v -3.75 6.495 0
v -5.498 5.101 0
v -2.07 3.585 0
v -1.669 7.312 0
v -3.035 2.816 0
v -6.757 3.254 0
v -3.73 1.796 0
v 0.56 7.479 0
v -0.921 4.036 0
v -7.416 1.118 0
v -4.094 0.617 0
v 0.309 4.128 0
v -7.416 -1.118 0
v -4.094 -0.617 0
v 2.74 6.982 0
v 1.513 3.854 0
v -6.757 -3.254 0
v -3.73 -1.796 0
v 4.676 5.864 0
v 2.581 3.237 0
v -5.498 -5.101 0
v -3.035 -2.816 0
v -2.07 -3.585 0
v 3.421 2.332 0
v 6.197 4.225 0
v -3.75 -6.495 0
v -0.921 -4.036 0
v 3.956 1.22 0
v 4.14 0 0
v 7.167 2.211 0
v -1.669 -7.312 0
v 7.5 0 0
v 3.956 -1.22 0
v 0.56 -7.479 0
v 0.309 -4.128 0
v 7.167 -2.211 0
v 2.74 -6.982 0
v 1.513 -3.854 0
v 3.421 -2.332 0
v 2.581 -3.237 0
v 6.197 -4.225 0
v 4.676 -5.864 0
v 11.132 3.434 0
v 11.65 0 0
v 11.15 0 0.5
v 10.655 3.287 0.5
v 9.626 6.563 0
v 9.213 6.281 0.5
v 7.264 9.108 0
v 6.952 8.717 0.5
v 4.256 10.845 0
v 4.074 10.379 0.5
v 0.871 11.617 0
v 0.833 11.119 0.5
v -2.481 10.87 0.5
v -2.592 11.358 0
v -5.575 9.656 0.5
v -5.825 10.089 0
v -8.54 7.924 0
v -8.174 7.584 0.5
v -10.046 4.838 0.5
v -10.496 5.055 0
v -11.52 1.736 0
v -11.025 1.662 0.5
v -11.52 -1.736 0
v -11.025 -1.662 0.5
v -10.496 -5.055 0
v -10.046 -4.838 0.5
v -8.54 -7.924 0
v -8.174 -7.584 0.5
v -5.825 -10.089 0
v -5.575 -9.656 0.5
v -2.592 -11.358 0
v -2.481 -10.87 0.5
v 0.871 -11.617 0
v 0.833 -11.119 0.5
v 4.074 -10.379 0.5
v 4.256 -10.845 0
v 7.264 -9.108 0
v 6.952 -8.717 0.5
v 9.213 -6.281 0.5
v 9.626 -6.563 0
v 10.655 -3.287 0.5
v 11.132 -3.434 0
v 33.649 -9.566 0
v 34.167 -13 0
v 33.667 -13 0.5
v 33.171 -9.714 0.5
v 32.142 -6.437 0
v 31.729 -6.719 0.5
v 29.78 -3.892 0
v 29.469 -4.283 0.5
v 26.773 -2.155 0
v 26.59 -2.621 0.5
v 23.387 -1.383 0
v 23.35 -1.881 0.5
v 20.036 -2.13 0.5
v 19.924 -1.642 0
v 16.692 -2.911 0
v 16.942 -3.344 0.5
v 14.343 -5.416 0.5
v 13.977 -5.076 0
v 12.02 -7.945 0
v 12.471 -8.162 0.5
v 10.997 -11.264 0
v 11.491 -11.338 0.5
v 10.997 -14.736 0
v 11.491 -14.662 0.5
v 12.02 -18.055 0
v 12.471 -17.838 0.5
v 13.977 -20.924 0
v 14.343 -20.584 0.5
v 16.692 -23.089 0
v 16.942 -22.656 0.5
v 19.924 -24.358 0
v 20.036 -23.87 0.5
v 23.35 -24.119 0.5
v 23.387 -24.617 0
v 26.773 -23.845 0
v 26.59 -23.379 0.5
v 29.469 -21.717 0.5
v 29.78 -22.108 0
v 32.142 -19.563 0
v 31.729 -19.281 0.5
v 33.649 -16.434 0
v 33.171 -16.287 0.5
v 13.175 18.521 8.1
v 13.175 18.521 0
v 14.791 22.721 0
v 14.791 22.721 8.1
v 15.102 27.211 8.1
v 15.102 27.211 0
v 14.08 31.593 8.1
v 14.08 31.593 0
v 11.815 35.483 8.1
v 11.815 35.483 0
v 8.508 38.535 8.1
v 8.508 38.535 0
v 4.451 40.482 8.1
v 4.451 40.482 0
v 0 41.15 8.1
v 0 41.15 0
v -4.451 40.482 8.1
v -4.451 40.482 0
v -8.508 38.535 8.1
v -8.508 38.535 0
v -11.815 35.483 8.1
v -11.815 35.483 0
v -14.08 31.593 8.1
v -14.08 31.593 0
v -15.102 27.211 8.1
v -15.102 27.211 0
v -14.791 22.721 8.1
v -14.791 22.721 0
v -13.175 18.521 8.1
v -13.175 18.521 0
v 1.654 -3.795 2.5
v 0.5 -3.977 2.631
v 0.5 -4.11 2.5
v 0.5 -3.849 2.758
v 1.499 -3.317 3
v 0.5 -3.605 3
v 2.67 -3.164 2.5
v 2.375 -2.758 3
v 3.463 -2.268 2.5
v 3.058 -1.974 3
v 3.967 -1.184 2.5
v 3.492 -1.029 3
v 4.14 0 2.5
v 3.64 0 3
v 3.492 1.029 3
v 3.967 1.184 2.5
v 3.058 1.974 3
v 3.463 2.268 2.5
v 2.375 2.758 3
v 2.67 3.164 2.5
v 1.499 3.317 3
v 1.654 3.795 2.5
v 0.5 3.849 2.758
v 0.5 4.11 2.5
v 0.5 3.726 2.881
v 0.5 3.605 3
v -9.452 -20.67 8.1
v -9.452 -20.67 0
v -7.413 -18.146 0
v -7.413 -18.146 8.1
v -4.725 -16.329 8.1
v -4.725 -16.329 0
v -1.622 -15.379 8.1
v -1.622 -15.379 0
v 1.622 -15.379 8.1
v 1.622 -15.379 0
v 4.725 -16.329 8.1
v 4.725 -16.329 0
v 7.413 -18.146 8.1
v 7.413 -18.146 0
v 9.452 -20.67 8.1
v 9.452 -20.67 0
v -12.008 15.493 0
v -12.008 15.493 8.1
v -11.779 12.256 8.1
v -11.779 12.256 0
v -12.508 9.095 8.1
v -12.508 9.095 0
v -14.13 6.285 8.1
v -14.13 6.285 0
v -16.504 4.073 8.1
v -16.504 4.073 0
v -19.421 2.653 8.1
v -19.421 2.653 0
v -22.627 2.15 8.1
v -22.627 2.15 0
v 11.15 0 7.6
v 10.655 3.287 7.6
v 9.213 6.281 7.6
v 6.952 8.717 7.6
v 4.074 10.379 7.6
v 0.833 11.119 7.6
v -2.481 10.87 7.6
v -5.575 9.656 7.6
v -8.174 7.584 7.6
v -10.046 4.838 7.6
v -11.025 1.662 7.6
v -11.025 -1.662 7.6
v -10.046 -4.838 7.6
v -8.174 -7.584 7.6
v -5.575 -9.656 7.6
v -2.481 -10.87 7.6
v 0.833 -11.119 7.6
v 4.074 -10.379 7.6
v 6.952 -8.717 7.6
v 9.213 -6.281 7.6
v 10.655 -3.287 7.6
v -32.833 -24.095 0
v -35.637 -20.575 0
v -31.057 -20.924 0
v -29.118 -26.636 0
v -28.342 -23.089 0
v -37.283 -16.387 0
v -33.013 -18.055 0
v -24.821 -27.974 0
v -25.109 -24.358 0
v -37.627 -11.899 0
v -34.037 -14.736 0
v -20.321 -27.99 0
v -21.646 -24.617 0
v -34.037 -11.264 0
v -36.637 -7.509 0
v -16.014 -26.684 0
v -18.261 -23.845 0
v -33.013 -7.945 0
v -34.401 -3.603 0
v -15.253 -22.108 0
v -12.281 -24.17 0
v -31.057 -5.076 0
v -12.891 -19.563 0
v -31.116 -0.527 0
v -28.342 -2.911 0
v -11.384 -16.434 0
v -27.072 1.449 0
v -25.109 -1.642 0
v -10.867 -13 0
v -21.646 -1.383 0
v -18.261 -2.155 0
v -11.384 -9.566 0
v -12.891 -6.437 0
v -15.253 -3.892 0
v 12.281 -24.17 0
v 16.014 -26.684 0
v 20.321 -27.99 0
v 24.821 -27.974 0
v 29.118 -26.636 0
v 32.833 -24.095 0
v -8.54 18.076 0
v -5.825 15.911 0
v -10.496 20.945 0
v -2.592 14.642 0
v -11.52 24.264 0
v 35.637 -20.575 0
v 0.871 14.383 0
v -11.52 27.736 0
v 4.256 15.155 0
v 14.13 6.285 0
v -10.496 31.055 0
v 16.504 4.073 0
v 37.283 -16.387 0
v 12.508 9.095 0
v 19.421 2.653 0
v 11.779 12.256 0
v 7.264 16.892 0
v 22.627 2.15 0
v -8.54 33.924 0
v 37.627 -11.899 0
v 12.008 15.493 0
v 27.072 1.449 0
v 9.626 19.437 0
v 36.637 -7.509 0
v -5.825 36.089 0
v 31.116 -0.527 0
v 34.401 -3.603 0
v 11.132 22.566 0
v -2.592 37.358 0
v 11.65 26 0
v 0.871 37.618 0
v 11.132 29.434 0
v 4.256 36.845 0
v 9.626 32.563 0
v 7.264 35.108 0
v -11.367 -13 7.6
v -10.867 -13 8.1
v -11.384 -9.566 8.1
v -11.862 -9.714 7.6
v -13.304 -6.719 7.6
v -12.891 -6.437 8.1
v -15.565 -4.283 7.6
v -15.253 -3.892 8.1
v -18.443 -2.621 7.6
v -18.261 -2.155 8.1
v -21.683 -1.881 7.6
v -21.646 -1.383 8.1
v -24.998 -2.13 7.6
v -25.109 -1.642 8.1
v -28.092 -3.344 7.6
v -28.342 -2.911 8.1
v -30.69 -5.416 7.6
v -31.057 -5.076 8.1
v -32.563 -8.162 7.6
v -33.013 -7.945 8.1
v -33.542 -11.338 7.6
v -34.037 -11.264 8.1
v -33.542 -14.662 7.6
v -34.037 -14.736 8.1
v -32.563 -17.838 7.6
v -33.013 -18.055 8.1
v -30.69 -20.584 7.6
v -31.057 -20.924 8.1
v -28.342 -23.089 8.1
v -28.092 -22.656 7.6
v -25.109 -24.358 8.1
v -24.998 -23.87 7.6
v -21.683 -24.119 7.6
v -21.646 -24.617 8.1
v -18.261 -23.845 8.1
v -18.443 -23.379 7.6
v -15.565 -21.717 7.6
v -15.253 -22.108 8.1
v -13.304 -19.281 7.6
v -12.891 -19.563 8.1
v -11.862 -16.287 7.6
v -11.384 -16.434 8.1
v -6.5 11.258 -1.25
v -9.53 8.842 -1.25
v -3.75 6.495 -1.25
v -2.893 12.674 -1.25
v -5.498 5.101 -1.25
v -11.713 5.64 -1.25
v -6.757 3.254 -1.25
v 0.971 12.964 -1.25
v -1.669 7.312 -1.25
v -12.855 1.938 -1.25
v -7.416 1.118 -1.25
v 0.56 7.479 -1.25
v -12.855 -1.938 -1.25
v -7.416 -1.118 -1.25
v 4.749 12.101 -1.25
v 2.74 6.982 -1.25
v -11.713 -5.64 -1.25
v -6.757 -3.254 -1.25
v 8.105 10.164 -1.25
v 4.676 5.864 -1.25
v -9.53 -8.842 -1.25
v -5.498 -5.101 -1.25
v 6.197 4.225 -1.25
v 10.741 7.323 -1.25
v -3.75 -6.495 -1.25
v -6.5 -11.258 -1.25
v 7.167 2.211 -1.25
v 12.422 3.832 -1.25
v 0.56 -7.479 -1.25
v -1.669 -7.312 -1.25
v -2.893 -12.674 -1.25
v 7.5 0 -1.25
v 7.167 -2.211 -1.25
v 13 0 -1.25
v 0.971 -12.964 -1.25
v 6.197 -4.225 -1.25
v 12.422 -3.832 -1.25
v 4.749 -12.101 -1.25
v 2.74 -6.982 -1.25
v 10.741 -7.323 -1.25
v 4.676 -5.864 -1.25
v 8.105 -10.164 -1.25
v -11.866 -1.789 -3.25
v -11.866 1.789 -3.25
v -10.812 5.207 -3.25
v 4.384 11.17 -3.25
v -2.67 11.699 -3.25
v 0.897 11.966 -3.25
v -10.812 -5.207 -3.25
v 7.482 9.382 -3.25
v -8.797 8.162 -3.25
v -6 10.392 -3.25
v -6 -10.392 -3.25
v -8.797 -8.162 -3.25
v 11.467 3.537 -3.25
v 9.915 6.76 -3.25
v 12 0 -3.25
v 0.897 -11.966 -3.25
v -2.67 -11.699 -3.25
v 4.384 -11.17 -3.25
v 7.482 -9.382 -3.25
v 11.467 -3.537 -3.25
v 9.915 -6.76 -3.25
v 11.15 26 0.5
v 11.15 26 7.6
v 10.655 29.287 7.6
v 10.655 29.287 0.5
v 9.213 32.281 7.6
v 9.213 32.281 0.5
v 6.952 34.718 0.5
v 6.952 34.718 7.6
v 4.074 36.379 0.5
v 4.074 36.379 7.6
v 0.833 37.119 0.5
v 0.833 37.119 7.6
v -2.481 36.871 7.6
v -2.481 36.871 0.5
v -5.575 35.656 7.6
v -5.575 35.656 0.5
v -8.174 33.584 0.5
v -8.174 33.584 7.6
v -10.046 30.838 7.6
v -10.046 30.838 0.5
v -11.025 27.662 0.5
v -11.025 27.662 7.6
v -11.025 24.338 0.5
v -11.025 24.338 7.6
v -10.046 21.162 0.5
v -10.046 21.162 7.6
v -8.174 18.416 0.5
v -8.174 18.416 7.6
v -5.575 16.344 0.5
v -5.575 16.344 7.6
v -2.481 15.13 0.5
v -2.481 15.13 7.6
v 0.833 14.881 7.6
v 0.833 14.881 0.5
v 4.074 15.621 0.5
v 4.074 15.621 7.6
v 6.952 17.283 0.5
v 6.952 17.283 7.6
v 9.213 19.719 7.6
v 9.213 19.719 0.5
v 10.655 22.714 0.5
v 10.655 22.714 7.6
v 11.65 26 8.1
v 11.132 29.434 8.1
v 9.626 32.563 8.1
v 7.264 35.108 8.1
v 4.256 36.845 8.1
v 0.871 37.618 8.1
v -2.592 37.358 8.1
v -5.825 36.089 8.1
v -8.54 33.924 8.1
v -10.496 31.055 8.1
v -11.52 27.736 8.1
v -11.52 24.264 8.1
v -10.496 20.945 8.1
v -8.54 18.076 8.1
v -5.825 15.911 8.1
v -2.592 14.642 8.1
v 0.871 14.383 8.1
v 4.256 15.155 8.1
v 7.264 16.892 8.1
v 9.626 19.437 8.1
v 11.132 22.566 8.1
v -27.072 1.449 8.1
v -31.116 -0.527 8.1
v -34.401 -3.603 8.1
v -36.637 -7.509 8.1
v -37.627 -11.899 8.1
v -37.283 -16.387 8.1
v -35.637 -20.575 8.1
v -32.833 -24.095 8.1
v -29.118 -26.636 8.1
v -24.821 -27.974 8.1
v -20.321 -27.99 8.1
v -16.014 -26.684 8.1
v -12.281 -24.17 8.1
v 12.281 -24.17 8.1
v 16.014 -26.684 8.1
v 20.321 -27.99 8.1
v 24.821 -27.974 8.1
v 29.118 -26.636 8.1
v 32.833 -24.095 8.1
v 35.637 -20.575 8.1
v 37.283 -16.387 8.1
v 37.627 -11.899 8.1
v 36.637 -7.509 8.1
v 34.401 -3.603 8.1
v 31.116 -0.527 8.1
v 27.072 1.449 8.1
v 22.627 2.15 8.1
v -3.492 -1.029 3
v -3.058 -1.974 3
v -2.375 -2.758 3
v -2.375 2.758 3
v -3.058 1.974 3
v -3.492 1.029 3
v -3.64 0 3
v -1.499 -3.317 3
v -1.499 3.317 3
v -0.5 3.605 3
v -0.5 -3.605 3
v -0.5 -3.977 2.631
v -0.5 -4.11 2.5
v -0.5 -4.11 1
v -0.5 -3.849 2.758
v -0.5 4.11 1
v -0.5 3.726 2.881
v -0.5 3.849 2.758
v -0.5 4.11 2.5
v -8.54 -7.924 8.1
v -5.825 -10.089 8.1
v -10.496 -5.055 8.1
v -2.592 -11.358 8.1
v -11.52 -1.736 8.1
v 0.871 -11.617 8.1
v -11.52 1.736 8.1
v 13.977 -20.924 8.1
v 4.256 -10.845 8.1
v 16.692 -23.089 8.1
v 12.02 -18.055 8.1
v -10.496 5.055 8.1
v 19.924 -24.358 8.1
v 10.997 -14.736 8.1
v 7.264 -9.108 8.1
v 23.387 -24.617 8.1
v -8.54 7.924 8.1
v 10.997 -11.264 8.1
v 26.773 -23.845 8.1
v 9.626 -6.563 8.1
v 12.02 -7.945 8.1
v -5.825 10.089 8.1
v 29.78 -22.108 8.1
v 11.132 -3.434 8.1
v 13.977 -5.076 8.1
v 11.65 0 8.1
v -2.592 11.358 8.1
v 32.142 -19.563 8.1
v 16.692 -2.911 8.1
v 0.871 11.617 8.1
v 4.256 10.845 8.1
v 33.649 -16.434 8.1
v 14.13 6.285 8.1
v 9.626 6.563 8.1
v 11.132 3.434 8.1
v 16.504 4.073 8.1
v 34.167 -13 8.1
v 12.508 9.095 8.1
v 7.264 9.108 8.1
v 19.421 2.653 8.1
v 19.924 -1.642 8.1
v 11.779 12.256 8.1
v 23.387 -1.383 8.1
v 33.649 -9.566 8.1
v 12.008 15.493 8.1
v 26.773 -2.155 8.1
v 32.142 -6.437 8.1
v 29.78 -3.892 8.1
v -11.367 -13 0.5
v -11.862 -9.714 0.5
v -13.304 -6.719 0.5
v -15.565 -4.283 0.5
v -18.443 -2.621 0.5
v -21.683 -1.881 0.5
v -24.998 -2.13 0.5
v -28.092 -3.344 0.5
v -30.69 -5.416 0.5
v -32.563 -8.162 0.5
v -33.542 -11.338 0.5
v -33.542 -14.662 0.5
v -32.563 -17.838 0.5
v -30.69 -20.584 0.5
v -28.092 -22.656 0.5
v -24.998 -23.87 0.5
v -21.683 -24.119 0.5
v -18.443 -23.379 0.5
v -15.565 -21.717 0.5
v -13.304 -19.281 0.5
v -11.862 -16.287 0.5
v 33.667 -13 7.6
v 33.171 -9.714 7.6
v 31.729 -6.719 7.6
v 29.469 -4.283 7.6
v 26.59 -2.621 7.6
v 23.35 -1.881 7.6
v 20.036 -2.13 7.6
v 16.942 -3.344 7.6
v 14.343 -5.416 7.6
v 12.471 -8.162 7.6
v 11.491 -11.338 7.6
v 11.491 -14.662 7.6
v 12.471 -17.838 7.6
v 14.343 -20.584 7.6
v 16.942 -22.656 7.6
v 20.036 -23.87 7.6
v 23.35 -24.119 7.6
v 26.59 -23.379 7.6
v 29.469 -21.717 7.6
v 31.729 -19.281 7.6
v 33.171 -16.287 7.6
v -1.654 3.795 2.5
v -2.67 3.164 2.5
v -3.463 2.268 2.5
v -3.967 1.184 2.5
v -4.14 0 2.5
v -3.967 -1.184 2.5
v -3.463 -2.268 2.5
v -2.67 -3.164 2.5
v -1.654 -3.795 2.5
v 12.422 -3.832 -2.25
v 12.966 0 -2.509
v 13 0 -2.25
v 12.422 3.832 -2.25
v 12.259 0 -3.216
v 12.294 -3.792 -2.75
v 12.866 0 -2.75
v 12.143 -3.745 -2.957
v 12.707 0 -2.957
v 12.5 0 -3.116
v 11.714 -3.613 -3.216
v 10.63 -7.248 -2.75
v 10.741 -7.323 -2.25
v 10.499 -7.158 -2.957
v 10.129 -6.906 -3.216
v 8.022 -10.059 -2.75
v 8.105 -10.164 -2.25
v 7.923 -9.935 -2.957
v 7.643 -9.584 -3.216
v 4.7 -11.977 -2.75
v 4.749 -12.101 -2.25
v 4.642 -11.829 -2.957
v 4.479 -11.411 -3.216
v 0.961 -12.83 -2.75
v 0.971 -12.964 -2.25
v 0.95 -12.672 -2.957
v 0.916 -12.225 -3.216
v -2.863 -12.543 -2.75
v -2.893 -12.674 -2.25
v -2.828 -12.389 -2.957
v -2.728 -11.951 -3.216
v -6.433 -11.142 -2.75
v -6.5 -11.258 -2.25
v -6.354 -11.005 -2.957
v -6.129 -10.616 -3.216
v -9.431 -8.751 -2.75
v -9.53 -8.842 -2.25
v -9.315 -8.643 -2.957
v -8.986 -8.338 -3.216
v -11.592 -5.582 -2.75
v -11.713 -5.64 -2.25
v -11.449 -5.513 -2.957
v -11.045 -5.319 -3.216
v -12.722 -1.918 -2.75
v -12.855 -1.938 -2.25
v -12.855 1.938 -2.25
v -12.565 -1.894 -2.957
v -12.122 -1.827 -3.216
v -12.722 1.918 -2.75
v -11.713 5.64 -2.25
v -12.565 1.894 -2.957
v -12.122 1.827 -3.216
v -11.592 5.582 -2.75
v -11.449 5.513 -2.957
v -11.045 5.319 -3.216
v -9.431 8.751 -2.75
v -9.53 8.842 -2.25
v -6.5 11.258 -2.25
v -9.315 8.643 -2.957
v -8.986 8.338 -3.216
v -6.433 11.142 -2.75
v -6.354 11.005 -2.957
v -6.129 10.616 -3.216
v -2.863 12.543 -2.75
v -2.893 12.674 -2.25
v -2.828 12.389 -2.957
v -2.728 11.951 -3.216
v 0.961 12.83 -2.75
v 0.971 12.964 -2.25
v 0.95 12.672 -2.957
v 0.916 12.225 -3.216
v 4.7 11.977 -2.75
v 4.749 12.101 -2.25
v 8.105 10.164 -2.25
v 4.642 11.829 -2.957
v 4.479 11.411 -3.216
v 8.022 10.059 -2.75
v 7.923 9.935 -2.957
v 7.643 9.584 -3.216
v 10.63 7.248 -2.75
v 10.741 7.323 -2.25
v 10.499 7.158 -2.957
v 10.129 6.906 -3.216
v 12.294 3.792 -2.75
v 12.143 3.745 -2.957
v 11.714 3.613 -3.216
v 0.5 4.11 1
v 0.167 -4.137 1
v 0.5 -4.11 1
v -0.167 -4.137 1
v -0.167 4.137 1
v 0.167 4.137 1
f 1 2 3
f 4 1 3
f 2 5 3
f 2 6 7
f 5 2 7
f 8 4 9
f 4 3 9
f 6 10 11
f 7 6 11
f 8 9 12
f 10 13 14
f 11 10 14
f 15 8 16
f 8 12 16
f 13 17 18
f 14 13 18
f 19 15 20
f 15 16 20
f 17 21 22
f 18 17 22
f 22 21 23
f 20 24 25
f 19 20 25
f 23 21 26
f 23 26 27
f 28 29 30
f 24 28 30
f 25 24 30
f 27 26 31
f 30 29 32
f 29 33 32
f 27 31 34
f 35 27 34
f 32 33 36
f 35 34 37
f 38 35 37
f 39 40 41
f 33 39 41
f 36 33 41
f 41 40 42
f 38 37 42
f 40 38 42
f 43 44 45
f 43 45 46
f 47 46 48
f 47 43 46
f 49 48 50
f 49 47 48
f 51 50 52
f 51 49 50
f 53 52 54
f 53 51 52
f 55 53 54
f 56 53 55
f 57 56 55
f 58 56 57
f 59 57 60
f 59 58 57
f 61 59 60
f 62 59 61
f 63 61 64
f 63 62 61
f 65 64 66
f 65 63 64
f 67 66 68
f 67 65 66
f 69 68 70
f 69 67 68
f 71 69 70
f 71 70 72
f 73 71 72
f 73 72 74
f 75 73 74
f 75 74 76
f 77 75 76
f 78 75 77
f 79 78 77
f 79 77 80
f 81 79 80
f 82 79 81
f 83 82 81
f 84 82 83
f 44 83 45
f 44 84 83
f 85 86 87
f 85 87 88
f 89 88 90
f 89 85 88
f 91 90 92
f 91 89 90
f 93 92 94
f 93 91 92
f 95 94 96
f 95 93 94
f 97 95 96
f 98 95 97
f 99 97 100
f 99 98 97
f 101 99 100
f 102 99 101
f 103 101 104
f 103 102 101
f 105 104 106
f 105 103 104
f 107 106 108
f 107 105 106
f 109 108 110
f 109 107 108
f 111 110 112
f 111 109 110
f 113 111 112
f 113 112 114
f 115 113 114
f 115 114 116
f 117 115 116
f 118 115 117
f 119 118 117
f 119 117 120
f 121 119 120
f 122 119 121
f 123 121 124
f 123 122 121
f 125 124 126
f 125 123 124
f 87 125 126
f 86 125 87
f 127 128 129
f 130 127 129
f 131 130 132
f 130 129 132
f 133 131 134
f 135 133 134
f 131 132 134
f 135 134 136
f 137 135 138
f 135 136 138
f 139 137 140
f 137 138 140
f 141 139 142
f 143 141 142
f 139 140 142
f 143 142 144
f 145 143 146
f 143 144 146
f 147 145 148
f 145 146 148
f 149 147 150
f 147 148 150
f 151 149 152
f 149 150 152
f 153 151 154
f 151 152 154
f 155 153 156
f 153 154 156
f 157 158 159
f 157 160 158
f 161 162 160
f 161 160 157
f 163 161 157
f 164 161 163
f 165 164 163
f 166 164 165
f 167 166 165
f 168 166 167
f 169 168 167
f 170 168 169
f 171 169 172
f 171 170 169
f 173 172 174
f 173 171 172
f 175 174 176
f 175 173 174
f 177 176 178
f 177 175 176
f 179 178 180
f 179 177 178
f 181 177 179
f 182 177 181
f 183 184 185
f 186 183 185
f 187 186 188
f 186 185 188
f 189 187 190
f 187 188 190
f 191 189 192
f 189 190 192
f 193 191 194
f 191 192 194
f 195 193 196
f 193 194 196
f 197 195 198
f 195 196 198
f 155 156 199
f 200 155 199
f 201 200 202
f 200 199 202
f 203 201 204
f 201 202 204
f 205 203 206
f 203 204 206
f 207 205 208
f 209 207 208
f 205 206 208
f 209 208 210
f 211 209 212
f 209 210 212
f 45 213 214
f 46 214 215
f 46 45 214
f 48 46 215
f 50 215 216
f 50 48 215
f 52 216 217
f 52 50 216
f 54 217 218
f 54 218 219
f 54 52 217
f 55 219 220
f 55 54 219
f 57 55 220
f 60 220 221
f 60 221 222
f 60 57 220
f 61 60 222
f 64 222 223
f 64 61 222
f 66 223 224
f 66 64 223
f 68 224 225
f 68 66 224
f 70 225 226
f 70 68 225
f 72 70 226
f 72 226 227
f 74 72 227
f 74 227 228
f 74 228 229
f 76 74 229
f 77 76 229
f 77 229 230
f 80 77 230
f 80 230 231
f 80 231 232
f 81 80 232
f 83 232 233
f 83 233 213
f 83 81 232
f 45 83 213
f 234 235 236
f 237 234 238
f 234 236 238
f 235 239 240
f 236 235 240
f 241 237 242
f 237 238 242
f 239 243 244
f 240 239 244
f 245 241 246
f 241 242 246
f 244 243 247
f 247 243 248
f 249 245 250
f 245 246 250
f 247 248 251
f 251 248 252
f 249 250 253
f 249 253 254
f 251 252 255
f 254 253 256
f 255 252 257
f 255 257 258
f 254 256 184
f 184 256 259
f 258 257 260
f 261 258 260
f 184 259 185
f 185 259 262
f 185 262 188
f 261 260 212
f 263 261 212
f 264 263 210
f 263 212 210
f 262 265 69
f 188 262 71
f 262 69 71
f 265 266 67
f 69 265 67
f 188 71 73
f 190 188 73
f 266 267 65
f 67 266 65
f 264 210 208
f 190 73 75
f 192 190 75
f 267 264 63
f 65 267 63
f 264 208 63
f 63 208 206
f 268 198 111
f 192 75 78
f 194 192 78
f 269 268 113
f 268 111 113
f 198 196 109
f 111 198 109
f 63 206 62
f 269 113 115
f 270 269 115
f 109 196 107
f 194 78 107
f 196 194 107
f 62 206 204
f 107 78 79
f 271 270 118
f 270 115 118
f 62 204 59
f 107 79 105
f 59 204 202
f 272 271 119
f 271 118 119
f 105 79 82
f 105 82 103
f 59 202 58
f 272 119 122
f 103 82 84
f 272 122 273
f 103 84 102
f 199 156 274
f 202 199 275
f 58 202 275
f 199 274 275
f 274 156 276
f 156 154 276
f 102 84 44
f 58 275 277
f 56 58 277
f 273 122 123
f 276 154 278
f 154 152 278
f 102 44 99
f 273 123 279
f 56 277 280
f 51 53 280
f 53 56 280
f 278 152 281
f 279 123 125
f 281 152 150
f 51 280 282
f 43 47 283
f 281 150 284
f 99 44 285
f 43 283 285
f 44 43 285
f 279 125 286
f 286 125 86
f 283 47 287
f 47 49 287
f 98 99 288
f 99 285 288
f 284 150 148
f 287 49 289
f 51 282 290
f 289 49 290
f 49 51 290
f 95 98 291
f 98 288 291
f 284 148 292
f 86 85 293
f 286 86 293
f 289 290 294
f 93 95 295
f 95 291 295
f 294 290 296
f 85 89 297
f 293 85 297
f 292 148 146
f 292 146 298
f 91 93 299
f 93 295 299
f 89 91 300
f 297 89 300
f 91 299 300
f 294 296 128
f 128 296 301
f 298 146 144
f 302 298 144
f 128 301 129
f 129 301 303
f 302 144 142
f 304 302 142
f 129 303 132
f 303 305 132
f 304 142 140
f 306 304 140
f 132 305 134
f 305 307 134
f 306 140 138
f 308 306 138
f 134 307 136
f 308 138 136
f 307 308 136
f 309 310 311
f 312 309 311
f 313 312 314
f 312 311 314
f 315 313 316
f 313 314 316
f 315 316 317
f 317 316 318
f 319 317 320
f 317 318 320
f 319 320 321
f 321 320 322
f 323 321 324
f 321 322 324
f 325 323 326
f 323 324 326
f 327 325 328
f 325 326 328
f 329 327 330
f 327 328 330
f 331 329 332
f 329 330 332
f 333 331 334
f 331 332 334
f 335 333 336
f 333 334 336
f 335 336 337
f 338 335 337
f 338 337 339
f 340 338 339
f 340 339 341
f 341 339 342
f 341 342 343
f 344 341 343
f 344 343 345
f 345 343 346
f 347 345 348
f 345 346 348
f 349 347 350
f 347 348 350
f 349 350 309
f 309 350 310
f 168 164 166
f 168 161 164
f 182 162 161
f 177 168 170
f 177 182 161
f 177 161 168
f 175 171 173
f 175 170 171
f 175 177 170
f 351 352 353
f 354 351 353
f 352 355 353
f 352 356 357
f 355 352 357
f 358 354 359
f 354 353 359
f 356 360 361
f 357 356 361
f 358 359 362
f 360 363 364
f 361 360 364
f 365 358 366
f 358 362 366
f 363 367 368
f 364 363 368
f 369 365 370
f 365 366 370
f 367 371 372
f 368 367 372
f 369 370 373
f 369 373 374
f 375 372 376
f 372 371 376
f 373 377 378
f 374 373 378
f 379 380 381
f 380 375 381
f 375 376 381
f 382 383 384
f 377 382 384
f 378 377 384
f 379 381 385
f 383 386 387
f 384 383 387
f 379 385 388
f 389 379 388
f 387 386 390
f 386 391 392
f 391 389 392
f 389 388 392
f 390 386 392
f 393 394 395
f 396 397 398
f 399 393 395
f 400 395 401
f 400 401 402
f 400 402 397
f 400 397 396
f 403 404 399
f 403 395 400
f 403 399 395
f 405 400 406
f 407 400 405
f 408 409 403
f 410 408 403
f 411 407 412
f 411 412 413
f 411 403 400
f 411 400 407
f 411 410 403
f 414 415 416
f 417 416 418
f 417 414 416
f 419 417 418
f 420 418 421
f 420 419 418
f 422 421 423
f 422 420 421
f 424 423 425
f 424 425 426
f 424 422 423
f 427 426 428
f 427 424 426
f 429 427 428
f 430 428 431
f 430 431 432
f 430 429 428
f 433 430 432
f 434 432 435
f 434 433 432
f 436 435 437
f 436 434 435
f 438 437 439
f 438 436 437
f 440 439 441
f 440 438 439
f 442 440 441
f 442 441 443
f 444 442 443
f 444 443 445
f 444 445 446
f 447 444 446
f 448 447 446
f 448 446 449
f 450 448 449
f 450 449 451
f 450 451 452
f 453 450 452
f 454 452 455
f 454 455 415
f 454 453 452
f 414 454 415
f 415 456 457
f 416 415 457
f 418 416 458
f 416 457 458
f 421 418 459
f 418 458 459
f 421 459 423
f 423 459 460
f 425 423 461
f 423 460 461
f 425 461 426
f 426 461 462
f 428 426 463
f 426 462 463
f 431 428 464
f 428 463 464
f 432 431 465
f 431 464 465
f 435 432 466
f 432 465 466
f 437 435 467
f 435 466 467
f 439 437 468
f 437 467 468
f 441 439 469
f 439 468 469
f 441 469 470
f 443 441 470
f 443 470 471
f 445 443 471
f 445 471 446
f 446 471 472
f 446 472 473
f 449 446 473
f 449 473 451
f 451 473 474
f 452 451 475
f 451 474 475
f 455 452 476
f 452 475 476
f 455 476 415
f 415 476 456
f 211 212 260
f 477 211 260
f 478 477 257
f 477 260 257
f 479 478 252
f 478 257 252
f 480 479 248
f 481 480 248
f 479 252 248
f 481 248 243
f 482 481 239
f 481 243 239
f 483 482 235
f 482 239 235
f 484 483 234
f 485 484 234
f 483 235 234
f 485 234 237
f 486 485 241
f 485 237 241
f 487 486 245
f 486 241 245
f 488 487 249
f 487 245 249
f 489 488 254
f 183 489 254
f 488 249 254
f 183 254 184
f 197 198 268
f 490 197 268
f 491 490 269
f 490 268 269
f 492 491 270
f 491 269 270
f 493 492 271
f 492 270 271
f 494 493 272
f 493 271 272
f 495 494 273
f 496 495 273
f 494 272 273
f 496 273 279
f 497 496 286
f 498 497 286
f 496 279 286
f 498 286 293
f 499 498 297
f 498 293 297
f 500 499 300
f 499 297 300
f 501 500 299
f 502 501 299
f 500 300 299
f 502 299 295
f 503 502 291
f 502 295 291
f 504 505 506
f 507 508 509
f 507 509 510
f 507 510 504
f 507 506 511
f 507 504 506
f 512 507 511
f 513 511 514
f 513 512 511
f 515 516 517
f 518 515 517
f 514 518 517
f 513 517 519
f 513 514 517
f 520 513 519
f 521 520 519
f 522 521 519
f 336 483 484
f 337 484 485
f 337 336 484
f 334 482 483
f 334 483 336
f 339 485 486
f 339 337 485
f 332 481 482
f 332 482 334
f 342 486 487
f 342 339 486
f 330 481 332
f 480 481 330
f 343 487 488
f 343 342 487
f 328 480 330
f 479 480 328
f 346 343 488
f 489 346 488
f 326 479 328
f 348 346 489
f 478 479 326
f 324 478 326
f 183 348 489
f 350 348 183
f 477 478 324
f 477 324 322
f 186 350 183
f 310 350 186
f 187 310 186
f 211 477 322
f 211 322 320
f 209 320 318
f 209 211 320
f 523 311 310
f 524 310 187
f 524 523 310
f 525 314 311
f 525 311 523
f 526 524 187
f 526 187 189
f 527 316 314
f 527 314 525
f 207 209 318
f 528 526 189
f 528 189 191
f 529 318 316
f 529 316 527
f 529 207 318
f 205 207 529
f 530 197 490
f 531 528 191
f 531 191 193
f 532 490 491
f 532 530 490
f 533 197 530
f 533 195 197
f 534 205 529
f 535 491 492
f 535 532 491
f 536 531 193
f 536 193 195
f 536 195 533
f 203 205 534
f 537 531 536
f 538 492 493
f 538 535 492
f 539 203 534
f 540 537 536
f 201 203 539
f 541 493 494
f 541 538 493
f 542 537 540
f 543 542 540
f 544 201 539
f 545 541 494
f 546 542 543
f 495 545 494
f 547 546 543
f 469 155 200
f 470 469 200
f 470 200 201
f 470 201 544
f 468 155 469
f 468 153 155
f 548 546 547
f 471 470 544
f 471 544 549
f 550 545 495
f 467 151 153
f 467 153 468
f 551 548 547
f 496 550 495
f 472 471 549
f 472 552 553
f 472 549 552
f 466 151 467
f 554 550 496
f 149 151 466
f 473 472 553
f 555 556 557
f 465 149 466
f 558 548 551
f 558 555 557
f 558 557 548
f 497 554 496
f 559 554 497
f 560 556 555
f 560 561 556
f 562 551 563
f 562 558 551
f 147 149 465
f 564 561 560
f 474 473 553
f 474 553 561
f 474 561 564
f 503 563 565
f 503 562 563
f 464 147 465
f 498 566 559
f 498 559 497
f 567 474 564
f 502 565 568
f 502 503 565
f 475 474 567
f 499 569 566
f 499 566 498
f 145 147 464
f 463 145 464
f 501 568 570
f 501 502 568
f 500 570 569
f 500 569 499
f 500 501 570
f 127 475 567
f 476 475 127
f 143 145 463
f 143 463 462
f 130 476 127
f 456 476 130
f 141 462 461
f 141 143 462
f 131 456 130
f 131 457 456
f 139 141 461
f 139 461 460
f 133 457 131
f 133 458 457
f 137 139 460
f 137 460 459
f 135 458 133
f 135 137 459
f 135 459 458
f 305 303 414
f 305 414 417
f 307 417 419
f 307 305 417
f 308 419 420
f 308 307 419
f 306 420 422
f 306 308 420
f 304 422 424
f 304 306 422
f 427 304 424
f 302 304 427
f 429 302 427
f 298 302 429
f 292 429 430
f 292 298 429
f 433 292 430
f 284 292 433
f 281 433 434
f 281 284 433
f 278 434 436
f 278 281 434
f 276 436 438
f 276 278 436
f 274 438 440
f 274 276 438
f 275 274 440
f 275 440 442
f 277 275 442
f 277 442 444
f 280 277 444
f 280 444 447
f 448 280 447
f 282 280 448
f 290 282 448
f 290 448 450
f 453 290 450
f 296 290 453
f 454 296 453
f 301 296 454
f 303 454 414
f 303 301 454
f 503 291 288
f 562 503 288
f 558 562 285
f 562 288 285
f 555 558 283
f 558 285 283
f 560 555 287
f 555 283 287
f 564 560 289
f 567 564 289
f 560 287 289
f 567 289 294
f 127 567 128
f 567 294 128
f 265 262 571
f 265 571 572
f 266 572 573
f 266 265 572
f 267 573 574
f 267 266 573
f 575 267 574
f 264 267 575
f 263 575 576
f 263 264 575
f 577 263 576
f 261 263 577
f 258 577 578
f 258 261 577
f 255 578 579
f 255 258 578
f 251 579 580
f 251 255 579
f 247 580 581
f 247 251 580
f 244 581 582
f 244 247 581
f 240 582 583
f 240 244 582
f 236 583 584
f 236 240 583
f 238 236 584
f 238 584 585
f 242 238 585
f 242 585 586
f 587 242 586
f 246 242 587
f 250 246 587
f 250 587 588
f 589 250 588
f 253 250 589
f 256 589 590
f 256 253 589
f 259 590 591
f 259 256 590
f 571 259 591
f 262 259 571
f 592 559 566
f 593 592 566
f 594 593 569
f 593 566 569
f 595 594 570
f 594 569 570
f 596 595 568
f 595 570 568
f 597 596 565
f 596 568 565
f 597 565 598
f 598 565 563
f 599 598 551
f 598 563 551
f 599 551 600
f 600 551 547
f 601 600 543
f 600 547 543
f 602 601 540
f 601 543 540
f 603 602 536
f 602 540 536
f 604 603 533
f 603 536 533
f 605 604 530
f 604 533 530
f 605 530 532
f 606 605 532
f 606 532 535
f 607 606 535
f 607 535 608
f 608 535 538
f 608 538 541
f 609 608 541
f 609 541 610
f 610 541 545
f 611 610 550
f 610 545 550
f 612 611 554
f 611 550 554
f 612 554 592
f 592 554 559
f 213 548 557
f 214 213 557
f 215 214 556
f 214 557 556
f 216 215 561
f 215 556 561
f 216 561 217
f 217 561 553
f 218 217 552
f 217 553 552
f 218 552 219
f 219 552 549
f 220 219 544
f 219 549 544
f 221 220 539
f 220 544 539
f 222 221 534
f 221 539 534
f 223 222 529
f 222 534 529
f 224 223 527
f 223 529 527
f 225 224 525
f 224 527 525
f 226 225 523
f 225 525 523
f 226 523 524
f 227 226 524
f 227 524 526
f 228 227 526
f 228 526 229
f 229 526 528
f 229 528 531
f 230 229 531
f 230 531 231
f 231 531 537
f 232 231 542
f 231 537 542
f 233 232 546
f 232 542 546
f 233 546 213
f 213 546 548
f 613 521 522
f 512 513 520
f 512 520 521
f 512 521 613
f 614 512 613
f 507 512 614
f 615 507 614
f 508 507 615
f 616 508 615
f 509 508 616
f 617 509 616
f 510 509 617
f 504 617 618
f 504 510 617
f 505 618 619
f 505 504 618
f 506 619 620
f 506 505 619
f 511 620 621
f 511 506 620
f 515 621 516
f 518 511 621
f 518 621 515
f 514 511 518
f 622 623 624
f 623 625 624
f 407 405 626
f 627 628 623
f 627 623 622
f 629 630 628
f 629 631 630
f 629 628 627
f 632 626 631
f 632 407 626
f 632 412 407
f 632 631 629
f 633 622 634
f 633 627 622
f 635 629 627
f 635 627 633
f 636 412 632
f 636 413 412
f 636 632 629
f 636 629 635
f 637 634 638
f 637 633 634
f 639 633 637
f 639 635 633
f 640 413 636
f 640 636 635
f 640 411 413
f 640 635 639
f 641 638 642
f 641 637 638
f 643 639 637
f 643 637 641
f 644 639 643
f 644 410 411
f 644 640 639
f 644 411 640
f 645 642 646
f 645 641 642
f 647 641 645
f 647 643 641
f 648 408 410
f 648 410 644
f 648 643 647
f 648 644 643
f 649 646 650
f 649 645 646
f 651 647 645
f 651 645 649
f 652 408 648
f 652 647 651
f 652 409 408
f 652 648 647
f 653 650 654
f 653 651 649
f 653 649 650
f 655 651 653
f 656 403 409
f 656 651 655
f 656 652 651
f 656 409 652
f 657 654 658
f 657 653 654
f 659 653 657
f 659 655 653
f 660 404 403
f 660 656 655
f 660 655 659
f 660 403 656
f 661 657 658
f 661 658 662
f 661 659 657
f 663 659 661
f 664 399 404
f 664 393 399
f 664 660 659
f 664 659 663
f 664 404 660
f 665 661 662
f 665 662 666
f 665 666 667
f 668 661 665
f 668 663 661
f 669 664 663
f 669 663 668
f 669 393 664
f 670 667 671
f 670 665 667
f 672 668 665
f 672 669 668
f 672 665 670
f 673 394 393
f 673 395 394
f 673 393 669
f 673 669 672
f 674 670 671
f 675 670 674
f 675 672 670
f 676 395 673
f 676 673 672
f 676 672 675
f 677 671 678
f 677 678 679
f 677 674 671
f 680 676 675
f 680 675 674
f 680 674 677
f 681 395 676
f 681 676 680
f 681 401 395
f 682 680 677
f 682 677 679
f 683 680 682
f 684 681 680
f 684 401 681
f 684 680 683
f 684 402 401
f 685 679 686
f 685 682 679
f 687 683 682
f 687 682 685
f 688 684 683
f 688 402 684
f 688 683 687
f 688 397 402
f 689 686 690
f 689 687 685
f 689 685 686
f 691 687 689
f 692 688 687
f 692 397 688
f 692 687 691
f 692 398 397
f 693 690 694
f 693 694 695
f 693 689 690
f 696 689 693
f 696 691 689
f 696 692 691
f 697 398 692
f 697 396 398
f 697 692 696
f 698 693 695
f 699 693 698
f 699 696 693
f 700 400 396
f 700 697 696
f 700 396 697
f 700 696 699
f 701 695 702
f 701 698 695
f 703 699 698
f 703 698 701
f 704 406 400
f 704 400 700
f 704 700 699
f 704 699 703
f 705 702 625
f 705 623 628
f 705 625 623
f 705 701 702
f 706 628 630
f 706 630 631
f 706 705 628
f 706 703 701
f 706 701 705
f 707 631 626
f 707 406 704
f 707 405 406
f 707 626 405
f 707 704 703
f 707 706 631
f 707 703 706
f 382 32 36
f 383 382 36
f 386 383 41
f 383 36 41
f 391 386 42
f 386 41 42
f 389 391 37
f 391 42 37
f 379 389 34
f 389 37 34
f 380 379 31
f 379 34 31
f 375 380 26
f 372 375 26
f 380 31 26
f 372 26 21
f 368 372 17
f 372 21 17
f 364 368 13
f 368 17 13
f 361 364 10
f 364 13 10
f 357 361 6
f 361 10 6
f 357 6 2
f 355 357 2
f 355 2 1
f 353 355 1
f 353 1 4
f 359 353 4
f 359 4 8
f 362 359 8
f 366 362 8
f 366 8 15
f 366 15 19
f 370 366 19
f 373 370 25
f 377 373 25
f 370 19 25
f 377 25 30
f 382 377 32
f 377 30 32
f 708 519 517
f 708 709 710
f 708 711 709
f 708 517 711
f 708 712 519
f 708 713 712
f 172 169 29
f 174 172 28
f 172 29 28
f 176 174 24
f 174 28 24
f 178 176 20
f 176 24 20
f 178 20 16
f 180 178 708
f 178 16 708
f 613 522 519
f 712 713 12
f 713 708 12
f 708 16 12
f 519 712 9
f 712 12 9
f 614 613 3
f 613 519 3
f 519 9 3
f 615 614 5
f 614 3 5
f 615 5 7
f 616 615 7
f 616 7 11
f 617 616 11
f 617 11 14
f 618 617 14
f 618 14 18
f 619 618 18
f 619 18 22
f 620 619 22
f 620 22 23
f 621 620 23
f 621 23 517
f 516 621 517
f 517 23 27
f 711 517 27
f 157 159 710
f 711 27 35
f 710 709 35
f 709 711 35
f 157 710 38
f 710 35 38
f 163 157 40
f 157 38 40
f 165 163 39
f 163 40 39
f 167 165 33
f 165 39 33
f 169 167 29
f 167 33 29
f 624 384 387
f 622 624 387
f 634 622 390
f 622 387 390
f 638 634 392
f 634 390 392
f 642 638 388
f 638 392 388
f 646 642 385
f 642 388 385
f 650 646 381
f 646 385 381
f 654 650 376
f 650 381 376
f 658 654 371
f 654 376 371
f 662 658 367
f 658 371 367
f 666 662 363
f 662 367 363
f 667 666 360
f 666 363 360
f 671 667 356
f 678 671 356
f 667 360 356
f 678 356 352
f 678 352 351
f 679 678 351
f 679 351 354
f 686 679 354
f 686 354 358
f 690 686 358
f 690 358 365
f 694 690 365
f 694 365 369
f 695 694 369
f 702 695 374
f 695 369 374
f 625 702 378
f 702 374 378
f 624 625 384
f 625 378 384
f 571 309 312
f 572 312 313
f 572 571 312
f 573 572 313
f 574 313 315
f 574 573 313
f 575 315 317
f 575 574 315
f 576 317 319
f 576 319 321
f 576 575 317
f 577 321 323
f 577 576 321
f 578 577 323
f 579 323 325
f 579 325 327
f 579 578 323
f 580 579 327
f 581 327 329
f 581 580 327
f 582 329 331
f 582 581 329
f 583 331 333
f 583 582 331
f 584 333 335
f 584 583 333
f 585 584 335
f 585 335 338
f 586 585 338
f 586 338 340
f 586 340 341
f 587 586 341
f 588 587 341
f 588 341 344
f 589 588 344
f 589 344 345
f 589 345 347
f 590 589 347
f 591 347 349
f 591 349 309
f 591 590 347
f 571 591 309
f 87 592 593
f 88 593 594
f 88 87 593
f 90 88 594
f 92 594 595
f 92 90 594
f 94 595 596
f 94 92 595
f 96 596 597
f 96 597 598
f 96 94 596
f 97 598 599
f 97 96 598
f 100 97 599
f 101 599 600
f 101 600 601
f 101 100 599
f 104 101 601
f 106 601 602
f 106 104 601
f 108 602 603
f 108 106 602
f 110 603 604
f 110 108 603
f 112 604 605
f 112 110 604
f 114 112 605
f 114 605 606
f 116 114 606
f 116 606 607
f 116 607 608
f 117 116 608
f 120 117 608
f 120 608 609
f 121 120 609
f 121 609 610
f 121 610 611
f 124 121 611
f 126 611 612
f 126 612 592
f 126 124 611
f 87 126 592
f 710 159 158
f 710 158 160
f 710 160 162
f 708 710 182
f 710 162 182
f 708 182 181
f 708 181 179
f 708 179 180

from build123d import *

# Parameters (mm, degrees)
F0_R      = 11.15
F1_DEPTH  = 8.1
F2_SIZE   = 0.5
F3_R      = 4.14
F4_DEPTH  = 3
F5_R      = 7.5
F6_DEPTH  = 1.25
F7_R      = 13
F8_DEPTH  = 2
F9_R      = 1
F10_SIZE  = 0.5
F11_W     = 1
F11_H     = 10.2475439198
F12_DEPTH = 2


# Not quite as in the source:
# - a feature names something its author has since deleted; it is built from what else it names


with BuildPart() as f1:
    # F0 (on Top) → F1 (new body)
    with BuildSketch(Plane.XY):
        with BuildLine():
            ThreePointArc((22.6266893771, 2.1495550685), (13.2144351026, 7.6293576707), (13.1749139786, 18.5205102804))
            ThreePointArc((13.1749139786, 18.5205102804), (0, 41.1500919302), (-13.1749139786, 18.5205102804))
            ThreePointArc((-13.1749139786, 18.5205102804), (-13.2144351026, 7.6293576707), (-22.6266893771, 2.1495550685))
            ThreePointArc((-22.6266893771, 2.1495550685), (-35.6370249735, -20.5750459546), (-9.4517753985, -20.6700653278))
            ThreePointArc((-9.4517753985, -20.6700653278), (0, -15.2587153203), (9.4517753985, -20.6700653278))
            ThreePointArc((9.4517753985, -20.6700653278), (35.6370249736, -20.5750459545), (22.6266893771, 2.1495550685))
        make_face()
        with Locations((-22.5167401062, -13.0000459546)):
            Circle(F0_R, mode=Mode.SUBTRACT)
        Circle(F0_R, mode=Mode.SUBTRACT)
        with Locations((22.5167401062, -13.0000459546)):
            Circle(F0_R, mode=Mode.SUBTRACT)
        with Locations((0, 26.0000919302)):
            Circle(F0_R, mode=Mode.SUBTRACT)
    extrude(amount=F1_DEPTH)

    # F2
    f2_edges = [f1.edges().sort_by_distance(p)[0] for p in [
        (-11.15, 0, 8.1),
        (-11.15, 26.000092, 8.1),
        (-11.15, 26.000092, 0),
        (-11.15, 0, 0),
        (11.36674, -13.000046, 8.1),
        (-33.66674, -13.000046, 8.1),
        (-33.66674, -13.000046, 0),
        (11.36674, -13.000046, 0),
    ]]
    chamfer(f2_edges, length=F2_SIZE)


with BuildPart() as f4:
    # F3 (on Top) → F4 (new body)
    with BuildSketch(Plane.XY):
        Circle(F3_R)
    extrude(amount=F4_DEPTH)

    # F5 (on face) → F6 (join)
    with BuildSketch(Plane(origin=(0, 0, 0), x_dir=(1, 0, 0), z_dir=(0, 0, -1))):
        Circle(F5_R)
    extrude(amount=F6_DEPTH)

    # F7 (on face) → F8 (join)
    with BuildSketch(Plane(origin=(0, 0, -1.25), x_dir=(1, 0, 0), z_dir=(0, 0, -1))):
        Circle(F7_R)
    extrude(amount=F8_DEPTH)

    # F9
    f9_edges = [f4.edges().sort_by_distance(p)[0] for p in [
        (-13, 0, -3.25),
    ]]
    fillet(f9_edges, radius=F9_R)

    # F10
    f10_edges = [f4.edges().sort_by_distance(p)[0] for p in [
        (-4.14, 0, 3),
    ]]
    chamfer(f10_edges, length=F10_SIZE)

    # F11 (on face) → F12 (cut)
    with BuildSketch(Plane.XY.offset(3)):
        with Locations((0, 0.1778125297)):
            Rectangle(F11_W, F11_H)
    extrude(amount=-F12_DEPTH, mode=Mode.SUBTRACT)


solid = Compound([f1.part, f4.part])
